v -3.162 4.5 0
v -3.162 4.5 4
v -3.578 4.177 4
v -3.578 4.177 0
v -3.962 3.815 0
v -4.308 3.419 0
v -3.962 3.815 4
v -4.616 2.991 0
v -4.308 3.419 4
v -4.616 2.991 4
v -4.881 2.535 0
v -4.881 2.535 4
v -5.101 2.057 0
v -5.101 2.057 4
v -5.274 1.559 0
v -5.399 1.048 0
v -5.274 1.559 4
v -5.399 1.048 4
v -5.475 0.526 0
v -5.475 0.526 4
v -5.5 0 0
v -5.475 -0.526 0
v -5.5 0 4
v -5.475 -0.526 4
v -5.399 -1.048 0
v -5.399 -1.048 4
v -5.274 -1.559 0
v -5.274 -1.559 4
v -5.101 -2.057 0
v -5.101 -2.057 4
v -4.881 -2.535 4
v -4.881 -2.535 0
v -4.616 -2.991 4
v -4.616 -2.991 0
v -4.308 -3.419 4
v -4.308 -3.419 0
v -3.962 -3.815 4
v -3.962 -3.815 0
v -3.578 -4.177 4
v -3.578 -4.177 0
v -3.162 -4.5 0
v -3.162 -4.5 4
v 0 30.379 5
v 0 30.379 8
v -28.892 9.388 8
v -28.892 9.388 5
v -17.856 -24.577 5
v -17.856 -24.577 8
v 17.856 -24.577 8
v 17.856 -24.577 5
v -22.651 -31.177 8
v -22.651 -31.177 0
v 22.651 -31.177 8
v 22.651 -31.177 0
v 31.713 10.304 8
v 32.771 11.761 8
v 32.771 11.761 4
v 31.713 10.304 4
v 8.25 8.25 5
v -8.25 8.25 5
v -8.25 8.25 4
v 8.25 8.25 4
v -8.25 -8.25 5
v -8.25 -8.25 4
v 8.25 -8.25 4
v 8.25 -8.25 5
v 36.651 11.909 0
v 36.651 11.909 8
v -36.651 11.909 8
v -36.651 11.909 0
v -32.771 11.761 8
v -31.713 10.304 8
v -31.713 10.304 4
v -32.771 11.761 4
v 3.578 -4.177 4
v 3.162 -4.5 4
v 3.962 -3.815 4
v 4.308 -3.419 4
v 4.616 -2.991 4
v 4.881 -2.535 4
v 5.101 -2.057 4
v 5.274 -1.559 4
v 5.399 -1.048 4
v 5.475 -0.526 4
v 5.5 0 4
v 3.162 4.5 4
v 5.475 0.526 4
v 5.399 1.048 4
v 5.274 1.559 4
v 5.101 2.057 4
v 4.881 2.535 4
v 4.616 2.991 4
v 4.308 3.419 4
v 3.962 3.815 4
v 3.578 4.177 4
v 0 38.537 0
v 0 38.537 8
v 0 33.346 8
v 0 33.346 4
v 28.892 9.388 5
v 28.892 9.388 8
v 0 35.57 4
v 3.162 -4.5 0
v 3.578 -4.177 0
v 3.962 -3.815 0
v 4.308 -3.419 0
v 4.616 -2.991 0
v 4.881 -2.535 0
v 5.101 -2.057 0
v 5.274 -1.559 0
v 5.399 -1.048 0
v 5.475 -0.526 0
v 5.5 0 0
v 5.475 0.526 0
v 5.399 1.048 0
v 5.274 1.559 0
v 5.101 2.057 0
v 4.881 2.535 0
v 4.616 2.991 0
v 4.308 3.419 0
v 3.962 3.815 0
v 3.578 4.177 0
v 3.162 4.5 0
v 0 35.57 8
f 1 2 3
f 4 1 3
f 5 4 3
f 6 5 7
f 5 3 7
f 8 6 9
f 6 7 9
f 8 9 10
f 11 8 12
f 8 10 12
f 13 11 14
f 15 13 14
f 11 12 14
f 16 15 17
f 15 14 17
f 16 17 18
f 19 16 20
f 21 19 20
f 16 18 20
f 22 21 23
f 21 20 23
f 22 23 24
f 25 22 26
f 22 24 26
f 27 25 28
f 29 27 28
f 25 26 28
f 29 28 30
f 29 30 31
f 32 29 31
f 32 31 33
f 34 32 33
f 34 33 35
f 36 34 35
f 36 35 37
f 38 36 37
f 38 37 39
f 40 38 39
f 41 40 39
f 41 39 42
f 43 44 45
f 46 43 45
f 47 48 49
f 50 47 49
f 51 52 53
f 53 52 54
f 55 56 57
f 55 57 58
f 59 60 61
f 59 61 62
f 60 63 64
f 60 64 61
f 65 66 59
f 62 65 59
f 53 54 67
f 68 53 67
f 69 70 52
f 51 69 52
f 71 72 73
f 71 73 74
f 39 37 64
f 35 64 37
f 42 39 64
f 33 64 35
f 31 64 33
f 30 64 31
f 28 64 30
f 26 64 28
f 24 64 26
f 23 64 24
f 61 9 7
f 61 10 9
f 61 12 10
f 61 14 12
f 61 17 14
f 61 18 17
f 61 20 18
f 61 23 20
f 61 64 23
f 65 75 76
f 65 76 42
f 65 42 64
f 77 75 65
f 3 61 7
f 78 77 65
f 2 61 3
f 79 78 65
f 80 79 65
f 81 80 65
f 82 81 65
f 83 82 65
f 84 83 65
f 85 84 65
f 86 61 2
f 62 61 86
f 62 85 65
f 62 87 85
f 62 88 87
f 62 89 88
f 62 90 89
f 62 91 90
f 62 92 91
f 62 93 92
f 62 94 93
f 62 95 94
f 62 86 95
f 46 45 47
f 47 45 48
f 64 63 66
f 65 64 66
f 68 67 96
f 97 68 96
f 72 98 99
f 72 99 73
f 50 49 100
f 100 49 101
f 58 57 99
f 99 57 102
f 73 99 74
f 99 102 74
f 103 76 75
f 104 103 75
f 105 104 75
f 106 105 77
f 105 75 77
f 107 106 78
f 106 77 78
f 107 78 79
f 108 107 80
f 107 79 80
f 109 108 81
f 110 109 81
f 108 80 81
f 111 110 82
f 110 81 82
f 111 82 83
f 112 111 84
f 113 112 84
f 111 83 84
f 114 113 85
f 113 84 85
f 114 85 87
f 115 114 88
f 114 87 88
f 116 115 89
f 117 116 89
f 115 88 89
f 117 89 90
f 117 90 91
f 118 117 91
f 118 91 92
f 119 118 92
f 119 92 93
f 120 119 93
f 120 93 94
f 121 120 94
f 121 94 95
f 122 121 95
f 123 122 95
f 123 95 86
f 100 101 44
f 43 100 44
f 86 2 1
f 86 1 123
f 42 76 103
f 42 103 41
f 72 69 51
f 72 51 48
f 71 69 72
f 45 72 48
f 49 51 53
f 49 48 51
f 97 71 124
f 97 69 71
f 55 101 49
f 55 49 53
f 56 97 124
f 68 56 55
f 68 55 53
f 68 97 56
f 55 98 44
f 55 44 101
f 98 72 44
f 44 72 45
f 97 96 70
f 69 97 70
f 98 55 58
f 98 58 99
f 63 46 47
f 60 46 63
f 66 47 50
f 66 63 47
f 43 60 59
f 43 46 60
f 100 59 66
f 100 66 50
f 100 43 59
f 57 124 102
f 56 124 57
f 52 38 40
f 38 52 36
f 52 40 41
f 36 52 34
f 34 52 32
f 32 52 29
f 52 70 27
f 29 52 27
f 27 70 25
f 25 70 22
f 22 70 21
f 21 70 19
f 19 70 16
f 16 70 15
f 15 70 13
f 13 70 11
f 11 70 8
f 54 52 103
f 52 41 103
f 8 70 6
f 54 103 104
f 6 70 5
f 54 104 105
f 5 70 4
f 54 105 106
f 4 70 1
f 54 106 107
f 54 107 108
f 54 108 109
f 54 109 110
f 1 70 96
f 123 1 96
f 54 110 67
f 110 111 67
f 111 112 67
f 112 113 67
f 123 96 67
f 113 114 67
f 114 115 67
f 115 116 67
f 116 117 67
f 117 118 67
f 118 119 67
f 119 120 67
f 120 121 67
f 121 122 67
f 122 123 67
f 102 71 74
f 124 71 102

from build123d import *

# Parameters (mm, degrees)
PAD_DEPTH       = 8
POCKET_DEPTH    = 4
POCKET001_DEPTH = 3
POCKET002_DEPTH = 5
SKETCH004_W     = 16.5
SKETCH004_H     = 16.5
POCKET003_DEPTH = 1


with BuildPart() as part:
    # Sketch → Pad (new body)
    with BuildSketch(Plane.XY):
        Polygon((0, 38.536997), (-36.650862, 11.908587), (-22.651479, -31.177086), (22.651479, -31.177086), (36.650862, 11.908587), align=None)
    extrude(amount=PAD_DEPTH)

    # Sketch001 (on Face7 of Pad) → Pocket (cut)
    with BuildSketch(Plane.XY.offset(8)):
        Polygon((-32.77148, 11.76056), (0, 35.570434), (32.77148, 11.76056), (31.713466, 10.30433), (0, 33.345512), (-31.713466, 10.30433), align=None)
    extrude(amount=-POCKET_DEPTH, mode=Mode.SUBTRACT)

    # Sketch002 (on Face5 of Pocket) → Pocket001 (cut)
    with BuildSketch(Plane.XY.offset(8)):
        Polygon((0, 30.378949), (-28.892097, 9.387611), (-17.856298, -24.577086), (17.856298, -24.577086), (28.892097, 9.387611), align=None)
    extrude(amount=-POCKET001_DEPTH, mode=Mode.SUBTRACT)

    # Sketch003 (on Face20 of Pocket001) → Pocket002 (cut)
    with BuildSketch(Plane.XY.offset(5)):
        with BuildLine():
            ThreePointArc((-3.162278, 4.5), (-5.5, 0), (-3.162278, -4.5))
            Line((3.162278, -4.5), (-3.162278, -4.5))
            ThreePointArc((3.162278, -4.5), (5.5, 0), (3.162278, 4.5))
            Line((-3.162278, 4.5), (3.162278, 4.5))
        make_face()
    extrude(amount=-POCKET002_DEPTH, mode=Mode.SUBTRACT)

    # Sketch004 (on Face23 of Pocket002) → Pocket003 (cut)
    with BuildSketch(Plane.XY.offset(5)):
        Rectangle(SKETCH004_W, SKETCH004_H)
    extrude(amount=-POCKET003_DEPTH, mode=Mode.SUBTRACT)


solid = part.part
